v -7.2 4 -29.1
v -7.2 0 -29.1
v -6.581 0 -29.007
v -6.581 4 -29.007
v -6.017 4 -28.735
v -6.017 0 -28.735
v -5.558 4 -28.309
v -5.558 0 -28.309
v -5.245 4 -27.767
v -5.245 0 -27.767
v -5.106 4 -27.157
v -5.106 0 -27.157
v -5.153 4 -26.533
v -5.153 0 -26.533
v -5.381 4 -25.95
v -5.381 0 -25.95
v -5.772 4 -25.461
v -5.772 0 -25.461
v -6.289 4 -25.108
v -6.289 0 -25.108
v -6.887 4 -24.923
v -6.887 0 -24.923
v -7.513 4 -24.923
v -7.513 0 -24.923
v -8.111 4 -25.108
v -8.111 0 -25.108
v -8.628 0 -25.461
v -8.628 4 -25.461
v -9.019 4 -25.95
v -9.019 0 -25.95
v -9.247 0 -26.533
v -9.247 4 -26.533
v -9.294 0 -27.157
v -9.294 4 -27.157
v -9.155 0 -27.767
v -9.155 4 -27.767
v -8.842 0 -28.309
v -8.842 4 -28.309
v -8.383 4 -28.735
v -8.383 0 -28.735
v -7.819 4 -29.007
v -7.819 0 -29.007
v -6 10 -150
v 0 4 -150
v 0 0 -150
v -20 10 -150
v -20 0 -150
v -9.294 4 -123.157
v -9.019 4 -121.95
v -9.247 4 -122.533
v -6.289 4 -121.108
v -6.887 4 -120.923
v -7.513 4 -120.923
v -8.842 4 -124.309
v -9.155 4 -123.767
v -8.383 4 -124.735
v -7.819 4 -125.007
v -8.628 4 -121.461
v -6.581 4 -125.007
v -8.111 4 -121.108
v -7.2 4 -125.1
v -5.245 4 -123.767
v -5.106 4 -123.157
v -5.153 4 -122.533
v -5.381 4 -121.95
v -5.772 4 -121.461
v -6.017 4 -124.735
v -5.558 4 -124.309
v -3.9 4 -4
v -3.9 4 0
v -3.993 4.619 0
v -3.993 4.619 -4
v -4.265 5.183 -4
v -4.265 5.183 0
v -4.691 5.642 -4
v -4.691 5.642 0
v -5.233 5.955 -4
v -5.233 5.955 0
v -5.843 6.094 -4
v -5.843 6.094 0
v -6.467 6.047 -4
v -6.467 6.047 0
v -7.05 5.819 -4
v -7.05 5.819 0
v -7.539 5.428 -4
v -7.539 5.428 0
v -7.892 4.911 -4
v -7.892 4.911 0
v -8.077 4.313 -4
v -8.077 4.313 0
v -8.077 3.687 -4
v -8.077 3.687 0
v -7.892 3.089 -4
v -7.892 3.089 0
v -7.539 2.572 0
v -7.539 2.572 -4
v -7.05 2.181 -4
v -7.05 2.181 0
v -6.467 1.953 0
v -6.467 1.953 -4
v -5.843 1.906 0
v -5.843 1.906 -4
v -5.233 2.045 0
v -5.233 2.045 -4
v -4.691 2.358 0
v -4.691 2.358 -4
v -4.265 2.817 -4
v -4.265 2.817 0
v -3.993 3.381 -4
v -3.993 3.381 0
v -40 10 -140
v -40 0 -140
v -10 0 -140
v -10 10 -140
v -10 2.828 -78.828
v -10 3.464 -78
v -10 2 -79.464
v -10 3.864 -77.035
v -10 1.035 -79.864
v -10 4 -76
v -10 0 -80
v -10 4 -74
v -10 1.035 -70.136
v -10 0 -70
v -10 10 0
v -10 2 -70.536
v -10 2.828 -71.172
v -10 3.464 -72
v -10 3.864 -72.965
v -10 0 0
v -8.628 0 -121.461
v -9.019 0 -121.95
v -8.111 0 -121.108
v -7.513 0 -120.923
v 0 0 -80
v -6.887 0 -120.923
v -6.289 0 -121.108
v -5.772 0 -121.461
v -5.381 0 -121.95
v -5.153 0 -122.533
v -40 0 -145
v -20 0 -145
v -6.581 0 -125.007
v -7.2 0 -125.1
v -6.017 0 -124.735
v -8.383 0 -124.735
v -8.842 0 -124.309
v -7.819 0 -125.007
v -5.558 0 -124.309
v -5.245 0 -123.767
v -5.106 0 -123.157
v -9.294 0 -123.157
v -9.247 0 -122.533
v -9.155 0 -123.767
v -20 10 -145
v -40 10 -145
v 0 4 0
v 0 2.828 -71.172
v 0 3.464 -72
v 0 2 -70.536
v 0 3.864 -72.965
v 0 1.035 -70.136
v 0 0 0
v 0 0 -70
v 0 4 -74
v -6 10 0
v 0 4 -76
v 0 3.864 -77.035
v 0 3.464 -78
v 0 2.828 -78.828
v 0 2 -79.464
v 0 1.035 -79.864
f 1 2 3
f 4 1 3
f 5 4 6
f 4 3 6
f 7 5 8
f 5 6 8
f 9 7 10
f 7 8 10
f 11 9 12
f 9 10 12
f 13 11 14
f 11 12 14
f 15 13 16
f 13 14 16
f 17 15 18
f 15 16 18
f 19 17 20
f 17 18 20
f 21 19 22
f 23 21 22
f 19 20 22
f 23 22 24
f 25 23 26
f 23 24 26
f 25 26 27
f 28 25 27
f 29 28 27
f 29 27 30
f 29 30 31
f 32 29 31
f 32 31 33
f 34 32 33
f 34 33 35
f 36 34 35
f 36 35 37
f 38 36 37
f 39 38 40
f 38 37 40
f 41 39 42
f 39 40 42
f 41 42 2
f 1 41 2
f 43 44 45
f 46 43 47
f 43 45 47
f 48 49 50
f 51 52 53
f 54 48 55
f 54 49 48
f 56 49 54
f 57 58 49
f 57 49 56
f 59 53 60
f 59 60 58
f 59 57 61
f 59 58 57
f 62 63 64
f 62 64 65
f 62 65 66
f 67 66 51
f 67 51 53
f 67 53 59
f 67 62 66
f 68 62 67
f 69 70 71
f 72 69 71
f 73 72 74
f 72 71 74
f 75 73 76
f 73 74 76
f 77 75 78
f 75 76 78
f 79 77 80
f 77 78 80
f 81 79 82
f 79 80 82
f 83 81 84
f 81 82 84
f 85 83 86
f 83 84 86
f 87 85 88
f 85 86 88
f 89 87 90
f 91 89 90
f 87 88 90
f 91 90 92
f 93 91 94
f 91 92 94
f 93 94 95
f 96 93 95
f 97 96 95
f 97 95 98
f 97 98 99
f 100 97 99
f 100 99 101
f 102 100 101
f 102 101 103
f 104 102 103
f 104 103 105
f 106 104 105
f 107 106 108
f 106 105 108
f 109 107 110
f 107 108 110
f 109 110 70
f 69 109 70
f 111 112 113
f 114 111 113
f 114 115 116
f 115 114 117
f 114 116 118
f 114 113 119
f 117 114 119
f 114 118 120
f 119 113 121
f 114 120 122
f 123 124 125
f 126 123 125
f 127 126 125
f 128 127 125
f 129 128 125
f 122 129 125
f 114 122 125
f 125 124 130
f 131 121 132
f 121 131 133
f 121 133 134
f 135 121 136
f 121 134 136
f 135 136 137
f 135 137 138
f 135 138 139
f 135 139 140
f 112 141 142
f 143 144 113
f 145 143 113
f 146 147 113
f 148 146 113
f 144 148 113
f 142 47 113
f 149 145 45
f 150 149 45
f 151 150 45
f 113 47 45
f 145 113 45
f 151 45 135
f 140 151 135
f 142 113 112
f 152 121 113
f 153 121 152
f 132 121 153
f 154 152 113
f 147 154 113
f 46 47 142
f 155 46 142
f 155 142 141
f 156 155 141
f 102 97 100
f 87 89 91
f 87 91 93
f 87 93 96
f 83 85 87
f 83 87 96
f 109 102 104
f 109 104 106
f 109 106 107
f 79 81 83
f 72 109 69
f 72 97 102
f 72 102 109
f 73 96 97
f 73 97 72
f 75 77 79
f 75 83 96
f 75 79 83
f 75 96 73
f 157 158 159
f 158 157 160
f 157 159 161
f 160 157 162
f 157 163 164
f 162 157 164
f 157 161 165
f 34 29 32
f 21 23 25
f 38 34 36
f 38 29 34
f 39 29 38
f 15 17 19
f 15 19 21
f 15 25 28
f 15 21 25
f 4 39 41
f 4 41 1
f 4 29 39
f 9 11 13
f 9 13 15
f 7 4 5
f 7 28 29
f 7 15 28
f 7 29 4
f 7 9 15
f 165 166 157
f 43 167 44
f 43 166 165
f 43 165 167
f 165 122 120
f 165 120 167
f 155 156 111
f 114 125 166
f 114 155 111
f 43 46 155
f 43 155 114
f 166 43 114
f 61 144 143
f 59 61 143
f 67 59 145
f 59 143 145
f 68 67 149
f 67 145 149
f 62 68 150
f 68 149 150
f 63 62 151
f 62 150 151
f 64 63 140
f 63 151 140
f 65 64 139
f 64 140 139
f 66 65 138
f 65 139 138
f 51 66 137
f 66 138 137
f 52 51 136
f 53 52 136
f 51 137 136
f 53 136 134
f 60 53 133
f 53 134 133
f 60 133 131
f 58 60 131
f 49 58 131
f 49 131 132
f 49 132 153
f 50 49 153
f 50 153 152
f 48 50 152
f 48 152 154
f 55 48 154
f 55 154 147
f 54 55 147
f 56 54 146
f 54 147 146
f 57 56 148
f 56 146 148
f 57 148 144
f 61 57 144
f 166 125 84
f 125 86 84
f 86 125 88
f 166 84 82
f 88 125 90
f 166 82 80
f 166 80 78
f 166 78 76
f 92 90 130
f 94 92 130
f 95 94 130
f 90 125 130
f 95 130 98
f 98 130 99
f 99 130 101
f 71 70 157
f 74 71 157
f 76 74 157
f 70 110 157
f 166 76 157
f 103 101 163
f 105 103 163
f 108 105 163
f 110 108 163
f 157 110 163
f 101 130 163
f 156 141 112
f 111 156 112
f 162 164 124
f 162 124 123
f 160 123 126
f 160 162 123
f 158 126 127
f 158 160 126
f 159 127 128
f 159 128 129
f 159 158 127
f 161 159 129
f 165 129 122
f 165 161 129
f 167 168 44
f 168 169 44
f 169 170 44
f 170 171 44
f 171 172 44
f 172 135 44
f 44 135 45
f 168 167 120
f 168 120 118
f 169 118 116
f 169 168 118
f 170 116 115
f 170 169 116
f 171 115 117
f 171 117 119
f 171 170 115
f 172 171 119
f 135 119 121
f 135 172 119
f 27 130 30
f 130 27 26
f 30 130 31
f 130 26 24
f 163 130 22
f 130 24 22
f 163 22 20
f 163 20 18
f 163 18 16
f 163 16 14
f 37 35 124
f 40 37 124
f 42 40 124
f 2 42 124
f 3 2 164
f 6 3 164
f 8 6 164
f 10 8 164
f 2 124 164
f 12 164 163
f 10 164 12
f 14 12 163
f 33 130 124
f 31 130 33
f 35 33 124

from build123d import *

# Parameters (mm, degrees)
DODANIE_WYCI_GNI_CIE1_DEPTH = 10
SZKIC2_R                    = 2.1
WYTNIJ_WYCI_GNI_CIE1_DEPTH  = 4
SZKIC3_R                    = 2.1
WYTNIJ_WYCI_GNI_CIE2_DEPTH  = 4
SFAZOWANIE1_SIZE            = 6
SZKIC4_W                    = 10
SZKIC4_H                    = 10
WYTNIJ_WYCI_GNI_CIE3_DEPTH  = 4
ZAOKR_GLENIE1_R             = 4


with BuildPart() as part:
    # Szkic1 → Dodanie-wyciągnięcie1 (new body)
    with BuildSketch(Plane(origin=(0, 0, 0), x_dir=(1, 0, 0), z_dir=(0, 1, 0))):
        Polygon((0, 0), (0, 150), (-20, 150), (-20, 145), (-40, 145), (-40, 140), (-10, 140), (-10, 0), align=None)
    extrude(amount=DODANIE_WYCI_GNI_CIE1_DEPTH)

    # Szkic2 → Wytnij-wyciągnięcie1 (cut)
    with BuildSketch(Plane.XZ):
        with Locations(Location((-7.2, -123, 0), (0, 0, 270))):
            Circle(SZKIC2_R)
        with Locations(Location((-7.2, -27, 0), (0, 0, 270))):
            Circle(SZKIC2_R)
    extrude(amount=-WYTNIJ_WYCI_GNI_CIE1_DEPTH, mode=Mode.SUBTRACT)

    # Szkic3 → Wytnij-wyciągnięcie2 (cut)
    with BuildSketch(Plane.XY):
        with Locations((-6, 4)):
            Circle(SZKIC3_R)
    extrude(amount=-WYTNIJ_WYCI_GNI_CIE2_DEPTH, mode=Mode.SUBTRACT)

    # Sfazowanie1
    sfazowanie1_edges = [part.edges().sort_by_distance(p)[0] for p in [
        (0, 10, -75),
    ]]
    chamfer(sfazowanie1_edges, length=SFAZOWANIE1_SIZE)

    # Szkic4 → Wytnij-wyciągnięcie3 (cut)
    with BuildSketch(Plane.XZ):
        with Locations((-5, -75)):
            Rectangle(SZKIC4_W, SZKIC4_H)
    extrude(amount=-WYTNIJ_WYCI_GNI_CIE3_DEPTH, mode=Mode.SUBTRACT)

    # Zaokrąglenie1
    zaokr_glenie1_edges = [part.edges().sort_by_distance(p)[0] for p in [
        (-5, 4, -80),
        (-5, 4, -70),
    ]]
    fillet(zaokr_glenie1_edges, radius=ZAOKR_GLENIE1_R - 0.0001)  # a hair under: the kernel refuses the full size


solid = part.part
